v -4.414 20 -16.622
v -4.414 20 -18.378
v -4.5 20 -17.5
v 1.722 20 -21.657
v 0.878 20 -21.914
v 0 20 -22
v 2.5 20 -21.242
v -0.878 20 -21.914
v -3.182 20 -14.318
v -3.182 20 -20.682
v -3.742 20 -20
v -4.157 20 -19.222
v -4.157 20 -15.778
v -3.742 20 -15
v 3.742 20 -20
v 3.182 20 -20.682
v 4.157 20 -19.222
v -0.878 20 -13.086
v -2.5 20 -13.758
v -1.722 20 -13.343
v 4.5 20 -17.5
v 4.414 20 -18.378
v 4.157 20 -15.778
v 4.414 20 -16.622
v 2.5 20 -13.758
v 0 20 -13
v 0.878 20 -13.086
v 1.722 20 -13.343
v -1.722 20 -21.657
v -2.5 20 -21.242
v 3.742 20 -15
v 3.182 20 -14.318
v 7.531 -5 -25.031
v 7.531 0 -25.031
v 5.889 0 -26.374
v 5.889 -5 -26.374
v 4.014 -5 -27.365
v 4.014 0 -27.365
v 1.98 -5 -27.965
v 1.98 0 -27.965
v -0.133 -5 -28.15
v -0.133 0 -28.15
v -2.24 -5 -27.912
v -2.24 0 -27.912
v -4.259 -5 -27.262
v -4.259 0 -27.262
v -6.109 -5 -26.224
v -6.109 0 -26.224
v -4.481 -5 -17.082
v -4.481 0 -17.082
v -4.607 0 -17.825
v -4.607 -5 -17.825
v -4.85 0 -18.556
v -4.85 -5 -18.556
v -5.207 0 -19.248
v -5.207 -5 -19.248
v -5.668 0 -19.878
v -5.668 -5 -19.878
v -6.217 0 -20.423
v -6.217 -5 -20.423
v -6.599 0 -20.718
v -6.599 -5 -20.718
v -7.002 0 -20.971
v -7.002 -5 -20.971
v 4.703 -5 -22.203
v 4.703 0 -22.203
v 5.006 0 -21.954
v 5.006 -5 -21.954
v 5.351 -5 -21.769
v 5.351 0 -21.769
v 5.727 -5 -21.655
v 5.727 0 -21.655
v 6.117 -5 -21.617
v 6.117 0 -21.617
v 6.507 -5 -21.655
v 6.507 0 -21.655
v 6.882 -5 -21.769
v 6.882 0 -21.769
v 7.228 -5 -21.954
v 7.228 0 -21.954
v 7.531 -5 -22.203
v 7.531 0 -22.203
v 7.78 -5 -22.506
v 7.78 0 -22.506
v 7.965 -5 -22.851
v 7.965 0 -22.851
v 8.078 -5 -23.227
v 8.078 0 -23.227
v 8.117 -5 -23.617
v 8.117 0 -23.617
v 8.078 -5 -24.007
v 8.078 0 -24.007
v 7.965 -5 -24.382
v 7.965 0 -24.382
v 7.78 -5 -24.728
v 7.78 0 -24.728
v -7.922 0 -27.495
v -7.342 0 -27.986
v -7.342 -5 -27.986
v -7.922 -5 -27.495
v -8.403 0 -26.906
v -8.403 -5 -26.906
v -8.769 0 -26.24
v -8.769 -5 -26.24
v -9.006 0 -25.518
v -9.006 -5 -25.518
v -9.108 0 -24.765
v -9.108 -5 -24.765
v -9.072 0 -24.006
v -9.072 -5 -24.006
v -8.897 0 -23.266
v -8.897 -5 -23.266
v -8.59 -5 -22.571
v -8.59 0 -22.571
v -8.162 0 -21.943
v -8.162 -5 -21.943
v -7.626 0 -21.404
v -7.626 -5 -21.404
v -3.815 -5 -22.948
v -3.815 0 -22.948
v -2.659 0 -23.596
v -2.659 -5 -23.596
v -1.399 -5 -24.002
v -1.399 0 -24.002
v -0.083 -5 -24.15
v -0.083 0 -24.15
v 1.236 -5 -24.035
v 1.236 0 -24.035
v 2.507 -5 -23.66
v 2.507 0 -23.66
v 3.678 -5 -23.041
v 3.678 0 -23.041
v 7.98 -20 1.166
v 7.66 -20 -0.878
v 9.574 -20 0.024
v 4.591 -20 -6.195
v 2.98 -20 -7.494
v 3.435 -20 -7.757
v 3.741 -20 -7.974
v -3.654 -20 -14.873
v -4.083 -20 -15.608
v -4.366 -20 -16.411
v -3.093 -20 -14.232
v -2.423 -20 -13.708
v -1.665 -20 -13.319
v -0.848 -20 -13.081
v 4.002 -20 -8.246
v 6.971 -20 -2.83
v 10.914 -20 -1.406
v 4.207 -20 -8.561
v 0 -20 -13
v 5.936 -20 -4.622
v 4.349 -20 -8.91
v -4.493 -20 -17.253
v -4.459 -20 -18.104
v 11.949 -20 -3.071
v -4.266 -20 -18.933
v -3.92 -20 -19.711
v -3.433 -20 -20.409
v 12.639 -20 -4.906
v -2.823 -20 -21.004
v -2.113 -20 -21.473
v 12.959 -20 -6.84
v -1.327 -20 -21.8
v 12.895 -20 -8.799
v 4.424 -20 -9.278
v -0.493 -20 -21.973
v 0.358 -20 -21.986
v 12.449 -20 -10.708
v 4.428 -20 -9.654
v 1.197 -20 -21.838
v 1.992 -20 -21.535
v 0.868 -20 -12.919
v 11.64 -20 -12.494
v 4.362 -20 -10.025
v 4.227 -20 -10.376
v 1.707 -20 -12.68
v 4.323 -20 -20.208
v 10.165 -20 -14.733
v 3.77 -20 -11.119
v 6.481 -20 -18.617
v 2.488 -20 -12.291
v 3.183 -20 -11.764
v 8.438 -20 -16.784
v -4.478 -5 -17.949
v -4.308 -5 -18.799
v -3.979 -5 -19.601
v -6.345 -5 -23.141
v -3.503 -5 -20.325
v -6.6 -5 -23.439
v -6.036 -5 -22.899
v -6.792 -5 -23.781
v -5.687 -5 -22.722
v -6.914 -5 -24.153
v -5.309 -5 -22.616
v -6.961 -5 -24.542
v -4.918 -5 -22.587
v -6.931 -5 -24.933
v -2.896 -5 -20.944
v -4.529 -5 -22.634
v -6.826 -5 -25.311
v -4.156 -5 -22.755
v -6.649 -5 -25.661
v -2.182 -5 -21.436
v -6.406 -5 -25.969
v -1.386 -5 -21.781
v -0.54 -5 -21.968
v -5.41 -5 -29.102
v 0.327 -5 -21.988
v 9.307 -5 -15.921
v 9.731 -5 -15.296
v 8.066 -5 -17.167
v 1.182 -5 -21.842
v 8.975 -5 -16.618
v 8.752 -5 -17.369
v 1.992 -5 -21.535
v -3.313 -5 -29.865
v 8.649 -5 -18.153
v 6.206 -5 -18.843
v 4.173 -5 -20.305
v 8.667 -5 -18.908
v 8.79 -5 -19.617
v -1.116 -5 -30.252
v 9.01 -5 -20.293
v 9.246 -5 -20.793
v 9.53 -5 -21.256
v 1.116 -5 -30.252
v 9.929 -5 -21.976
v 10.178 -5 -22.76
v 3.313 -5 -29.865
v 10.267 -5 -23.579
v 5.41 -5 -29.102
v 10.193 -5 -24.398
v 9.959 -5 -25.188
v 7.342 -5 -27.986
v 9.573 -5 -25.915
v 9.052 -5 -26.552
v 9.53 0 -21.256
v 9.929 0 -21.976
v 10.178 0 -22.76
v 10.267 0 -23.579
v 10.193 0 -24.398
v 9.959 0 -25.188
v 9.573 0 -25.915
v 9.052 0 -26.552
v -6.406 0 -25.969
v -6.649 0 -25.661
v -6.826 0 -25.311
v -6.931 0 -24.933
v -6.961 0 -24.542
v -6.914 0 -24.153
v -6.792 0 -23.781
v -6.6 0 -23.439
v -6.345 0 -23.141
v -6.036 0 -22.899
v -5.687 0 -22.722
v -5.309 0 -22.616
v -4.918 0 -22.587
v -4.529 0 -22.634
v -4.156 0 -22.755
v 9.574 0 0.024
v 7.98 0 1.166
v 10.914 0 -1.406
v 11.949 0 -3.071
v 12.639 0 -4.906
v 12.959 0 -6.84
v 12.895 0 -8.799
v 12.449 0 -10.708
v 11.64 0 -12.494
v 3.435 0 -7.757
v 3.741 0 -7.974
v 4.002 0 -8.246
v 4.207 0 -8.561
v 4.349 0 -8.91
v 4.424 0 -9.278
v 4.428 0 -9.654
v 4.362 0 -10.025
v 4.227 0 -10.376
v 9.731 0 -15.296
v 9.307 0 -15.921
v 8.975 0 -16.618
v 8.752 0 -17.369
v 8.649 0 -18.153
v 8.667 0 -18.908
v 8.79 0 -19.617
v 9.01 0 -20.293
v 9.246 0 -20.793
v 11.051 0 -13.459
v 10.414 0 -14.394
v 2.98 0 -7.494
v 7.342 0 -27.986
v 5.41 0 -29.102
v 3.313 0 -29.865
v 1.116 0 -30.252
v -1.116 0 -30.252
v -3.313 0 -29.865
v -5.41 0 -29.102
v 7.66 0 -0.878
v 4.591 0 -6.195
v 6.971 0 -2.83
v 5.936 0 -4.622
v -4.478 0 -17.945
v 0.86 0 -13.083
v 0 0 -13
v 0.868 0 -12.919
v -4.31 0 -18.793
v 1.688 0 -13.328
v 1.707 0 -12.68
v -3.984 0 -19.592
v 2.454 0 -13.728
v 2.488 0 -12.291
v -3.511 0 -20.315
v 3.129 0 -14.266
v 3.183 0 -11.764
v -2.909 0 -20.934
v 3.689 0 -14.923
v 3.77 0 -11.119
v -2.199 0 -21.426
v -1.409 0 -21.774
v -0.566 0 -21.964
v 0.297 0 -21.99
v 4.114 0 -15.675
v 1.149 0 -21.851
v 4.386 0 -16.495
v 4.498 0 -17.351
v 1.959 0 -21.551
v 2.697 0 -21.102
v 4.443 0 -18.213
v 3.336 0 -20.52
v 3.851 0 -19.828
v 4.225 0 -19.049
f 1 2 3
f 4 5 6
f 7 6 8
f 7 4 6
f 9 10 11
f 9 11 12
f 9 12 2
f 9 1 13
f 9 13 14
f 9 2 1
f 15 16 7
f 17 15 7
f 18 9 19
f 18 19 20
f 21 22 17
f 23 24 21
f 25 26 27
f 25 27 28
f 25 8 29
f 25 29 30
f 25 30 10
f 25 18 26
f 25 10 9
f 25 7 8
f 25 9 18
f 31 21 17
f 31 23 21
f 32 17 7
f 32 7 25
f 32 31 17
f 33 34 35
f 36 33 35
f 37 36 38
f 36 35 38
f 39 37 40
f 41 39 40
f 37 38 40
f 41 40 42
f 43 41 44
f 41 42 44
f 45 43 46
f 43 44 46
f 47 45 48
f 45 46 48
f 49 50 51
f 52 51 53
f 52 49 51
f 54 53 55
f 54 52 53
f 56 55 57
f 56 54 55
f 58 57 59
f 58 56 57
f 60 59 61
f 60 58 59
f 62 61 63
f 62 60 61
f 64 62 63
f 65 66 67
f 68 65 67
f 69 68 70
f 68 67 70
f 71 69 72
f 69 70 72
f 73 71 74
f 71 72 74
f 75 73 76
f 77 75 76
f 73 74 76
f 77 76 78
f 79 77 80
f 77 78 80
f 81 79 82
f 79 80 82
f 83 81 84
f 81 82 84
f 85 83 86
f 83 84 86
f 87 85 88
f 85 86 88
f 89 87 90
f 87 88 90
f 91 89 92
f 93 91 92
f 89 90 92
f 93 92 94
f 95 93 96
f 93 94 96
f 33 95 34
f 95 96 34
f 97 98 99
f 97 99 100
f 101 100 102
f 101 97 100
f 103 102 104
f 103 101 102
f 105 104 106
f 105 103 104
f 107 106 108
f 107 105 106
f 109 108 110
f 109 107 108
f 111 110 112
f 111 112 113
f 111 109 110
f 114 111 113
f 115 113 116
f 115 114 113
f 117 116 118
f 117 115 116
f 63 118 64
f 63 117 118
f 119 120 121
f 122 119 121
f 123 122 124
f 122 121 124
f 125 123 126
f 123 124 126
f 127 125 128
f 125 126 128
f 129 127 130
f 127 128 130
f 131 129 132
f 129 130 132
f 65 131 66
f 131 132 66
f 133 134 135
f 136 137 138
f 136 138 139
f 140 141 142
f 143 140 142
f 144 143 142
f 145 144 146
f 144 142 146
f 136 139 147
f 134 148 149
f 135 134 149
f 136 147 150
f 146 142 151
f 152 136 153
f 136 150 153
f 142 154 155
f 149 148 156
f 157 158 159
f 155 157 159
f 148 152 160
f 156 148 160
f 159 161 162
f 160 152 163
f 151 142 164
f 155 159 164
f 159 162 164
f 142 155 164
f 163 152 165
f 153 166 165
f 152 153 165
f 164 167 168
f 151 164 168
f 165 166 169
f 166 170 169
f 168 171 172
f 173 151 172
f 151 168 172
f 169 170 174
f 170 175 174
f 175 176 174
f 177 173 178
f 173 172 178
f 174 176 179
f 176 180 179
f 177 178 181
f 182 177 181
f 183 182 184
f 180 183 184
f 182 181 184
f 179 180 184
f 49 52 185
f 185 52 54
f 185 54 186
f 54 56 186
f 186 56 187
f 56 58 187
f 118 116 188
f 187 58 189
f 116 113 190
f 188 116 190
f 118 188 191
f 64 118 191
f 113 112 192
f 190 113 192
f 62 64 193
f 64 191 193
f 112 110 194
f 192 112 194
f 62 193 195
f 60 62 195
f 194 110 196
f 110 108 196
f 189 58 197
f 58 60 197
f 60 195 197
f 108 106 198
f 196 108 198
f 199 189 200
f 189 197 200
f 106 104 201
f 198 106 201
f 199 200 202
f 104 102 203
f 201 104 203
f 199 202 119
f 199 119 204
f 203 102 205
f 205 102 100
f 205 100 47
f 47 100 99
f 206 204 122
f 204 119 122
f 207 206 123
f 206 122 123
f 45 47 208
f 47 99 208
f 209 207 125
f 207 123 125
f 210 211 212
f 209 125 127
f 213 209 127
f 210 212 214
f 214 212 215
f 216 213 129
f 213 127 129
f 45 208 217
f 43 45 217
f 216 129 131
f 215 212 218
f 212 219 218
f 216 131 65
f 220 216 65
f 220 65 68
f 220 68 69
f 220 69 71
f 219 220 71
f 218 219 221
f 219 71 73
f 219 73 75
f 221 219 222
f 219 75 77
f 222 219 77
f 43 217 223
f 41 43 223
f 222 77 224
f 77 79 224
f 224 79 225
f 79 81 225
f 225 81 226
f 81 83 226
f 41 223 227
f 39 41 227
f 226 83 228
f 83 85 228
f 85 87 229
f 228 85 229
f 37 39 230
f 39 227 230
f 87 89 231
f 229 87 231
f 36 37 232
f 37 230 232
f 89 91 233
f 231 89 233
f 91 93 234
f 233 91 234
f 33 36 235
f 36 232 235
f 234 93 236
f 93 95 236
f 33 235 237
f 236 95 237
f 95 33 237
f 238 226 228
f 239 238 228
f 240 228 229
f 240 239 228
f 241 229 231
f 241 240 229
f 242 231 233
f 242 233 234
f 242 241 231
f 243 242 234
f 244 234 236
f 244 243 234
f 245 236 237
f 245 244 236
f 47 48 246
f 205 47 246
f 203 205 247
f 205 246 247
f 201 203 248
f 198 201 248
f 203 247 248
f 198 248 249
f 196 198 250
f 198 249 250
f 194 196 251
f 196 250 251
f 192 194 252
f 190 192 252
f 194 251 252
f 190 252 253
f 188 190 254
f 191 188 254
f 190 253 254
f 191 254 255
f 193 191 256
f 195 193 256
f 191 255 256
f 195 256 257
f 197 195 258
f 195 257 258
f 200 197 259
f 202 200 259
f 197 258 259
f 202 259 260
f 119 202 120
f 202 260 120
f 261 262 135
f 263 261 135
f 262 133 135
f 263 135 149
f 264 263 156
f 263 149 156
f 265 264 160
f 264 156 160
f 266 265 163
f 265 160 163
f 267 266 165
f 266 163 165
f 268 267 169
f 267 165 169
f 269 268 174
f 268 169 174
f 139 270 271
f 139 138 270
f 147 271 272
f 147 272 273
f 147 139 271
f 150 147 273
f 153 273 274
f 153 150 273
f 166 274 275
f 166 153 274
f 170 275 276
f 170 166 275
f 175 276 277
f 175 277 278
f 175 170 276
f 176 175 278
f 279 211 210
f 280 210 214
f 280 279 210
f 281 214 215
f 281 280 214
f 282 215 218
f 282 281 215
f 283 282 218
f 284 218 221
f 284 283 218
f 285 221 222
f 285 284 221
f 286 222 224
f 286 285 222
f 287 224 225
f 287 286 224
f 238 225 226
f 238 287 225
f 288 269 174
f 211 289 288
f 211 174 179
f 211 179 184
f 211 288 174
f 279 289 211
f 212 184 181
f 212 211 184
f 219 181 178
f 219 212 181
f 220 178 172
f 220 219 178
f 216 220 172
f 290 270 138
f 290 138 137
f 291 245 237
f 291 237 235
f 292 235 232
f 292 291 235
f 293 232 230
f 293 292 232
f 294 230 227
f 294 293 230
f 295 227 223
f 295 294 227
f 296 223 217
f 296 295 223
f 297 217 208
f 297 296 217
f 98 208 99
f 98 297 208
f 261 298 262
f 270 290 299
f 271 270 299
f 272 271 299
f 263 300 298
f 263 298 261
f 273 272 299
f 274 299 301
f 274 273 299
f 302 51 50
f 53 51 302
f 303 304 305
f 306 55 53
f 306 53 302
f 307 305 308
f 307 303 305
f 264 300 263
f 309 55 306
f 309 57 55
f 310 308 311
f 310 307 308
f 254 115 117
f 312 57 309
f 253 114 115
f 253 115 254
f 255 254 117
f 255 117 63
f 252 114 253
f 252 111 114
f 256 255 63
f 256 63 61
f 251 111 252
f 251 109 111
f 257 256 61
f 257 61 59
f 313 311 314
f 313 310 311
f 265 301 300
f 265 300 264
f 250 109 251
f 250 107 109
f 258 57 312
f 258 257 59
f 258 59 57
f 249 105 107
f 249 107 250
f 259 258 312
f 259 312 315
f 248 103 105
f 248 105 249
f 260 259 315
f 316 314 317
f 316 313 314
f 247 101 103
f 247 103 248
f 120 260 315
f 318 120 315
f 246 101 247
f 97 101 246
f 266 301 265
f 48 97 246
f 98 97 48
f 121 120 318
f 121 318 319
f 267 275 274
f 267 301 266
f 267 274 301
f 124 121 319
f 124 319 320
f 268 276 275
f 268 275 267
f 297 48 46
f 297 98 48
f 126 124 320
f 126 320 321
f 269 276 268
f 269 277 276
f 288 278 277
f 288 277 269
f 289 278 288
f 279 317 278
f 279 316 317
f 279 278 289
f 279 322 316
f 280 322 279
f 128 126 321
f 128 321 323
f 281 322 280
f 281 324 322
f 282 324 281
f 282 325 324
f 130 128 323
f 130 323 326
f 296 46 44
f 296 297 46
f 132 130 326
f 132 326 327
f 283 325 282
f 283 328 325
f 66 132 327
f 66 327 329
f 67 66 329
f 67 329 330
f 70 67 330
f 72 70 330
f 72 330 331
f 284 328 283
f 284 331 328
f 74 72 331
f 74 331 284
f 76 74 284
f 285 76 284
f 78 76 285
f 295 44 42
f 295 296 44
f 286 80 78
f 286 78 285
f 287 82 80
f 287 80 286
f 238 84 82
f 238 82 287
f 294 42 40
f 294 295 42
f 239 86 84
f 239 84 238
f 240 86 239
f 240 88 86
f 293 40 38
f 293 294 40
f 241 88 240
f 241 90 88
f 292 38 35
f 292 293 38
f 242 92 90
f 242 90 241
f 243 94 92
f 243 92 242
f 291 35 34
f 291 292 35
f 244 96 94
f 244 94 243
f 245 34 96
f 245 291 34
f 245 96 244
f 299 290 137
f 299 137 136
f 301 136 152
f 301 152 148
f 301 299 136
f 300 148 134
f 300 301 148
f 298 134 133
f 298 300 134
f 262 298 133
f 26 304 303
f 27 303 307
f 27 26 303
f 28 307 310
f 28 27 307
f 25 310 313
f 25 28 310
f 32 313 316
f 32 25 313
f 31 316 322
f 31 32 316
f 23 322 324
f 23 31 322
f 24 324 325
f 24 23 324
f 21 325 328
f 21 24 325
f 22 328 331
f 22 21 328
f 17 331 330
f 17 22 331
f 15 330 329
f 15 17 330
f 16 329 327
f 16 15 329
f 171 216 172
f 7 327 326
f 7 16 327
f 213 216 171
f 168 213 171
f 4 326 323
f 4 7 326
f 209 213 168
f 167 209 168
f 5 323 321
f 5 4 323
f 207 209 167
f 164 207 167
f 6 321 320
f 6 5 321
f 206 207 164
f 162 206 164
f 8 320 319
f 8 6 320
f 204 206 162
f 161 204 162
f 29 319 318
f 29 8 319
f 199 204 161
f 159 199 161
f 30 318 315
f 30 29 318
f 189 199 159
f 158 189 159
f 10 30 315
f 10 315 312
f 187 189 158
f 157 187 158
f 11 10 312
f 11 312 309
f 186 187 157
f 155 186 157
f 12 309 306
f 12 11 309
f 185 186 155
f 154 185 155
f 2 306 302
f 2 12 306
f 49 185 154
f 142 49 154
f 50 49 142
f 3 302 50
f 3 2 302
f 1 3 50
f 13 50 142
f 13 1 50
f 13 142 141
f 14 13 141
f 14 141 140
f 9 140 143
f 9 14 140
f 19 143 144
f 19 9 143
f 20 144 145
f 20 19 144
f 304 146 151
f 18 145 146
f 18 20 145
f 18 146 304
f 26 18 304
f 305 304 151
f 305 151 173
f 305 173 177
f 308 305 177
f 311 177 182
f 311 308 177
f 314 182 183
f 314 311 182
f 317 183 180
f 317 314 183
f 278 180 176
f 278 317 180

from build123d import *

# Parameters (mm, degrees)
SALIENTE_EXTRUIR1_DEPTH = 20
REDONDEO1_R             = 10
SALIENTE_EXTRUIR2_START = 20
CROQUIS1_4_R            = 4.5
SALIENTE_EXTRUIR2_DEPTH = 20
SALIENTE_EXTRUIR4_DEPTH = 5
REDONDEO4_R             = 5
REDONDEO5_R             = 2


with BuildPart() as part:
    # Croquis1 → Saliente-Extruir1 (new body)
    with BuildSketch(Plane(origin=(0, 0, 0), x_dir=(1, 0, 0), z_dir=(0, 1, 0))):
        with BuildLine():
            Line((4.71210557073282, 8.494038111608782), (2.980054763163943, 7.494038111608782))
            ThreePointArc((2.9800547631639436, 7.494038111608781), (6.495190528383288, 3.749999999999996), (7.9800547631639365, -1.1662159262356018))
            Line((7.980054763163938, -1.166215926235604), (16.640308801008324, 3.8337840737643942))
            Line((16.640308801008324, 3.833784073764395), (11.640308801008324, 12.49403811160878))
            ThreePointArc((11.640308801008327, 12.494038111608782), (7.486283619207324, 17.729429010253995), (1.992335720896067, 21.53492235058391))
            ThreePointArc((1.9923357208960657, 21.534922350583905), (-4.3821884132033615, 18.52294902668032), (2.49e-15, 13))
            ThreePointArc((4.3e-16, 13), (3.259893842188938, 11.692210023771297), (4.712105570732819, 8.494038111608784))
        make_face()
    extrude(amount=-SALIENTE_EXTRUIR1_DEPTH)

    # Redondeo1
    redondeo1_edges = [part.edges().sort_by_distance(p)[0] for p in [
        (16.640308801008324, -10, -3.8337840737643947),
    ]]
    fillet(redondeo1_edges, radius=REDONDEO1_R - 0.0001)  # a hair under: the kernel refuses the full size

    # Croquis1<4> → Saliente-Extruir2 (add)
    with BuildSketch(Plane(origin=(0, 0, 0), x_dir=(1, 0, 0), z_dir=(0, 1, 0)).offset(SALIENTE_EXTRUIR2_START)):
        with Locations(Location((4e-17, 17.5, 0), (0, 0, 270))):
            Circle(CROQUIS1_4_R)
    extrude(amount=-SALIENTE_EXTRUIR2_DEPTH)

    # Croquis2 → Saliente-Extruir4 (add)
    with BuildSketch(Plane(origin=(0, 0, 0), x_dir=(1, 0, 0), z_dir=(0, 1, 0))):
        with BuildLine():
            ThreePointArc((9.051706443450353, 26.551706443450232), (1.1156846733798031, 30.2523341701189), (-7.342378354819137, 27.986003012181577))
            ThreePointArc((-7.342378354819137, 27.986003012181577), (-8.36164556563995, 22.20545141012103), (-2.581093963579654, 21.186184199300502))
            ThreePointArc((-2.581093963579654, 21.186184199300502), (0.3922008423644143, 21.98287614141279), (3.181980515339327, 20.681980515339635))
            ThreePointArc((3.181980515339327, 20.681980515339635), (9.051706443449934, 20.681980515339355), (9.051706443450353, 26.551706443450232))
        make_face()
        with BuildLine():
            ThreePointArc((7.531057041767888, 25.031057041767813), (0.928254243367484, 28.109994551949146), (-6.108889031901341, 26.224397694318867))
            ThreePointArc((-6.108889031901341, 26.224397694318867), (-6.600040247777167, 23.438940733039082), (-3.814583286497142, 22.947789517162914))
            ThreePointArc((-3.814583286497142, 22.947789517162914), (0.579631272376833, 24.12521575958216), (4.702629917021658, 22.20262991702166))
            ThreePointArc((4.702629917021658, 22.20262991702166), (7.531057041767845, 22.20262991702162), (7.531057041767888, 25.031057041767813))
        make_face(mode=Mode.SUBTRACT)
    extrude(amount=-SALIENTE_EXTRUIR4_DEPTH)

    # Redondeo4
    redondeo4_edges = [part.edges().sort_by_distance(p)[0] for p in [
        (5.278570690107173, -2.5, -19.551853938657132),
        (-2.5810939635796544, -2.5, -21.1861841993005),
    ]]
    fillet(redondeo4_edges, radius=REDONDEO4_R)

    # Redondeo5
    redondeo5_edges = [part.edges().sort_by_distance(p)[0] for p in [
        (4.712105570732819, -10, -8.494038111608784),
    ]]
    fillet(redondeo5_edges, radius=REDONDEO5_R)


solid = part.part
